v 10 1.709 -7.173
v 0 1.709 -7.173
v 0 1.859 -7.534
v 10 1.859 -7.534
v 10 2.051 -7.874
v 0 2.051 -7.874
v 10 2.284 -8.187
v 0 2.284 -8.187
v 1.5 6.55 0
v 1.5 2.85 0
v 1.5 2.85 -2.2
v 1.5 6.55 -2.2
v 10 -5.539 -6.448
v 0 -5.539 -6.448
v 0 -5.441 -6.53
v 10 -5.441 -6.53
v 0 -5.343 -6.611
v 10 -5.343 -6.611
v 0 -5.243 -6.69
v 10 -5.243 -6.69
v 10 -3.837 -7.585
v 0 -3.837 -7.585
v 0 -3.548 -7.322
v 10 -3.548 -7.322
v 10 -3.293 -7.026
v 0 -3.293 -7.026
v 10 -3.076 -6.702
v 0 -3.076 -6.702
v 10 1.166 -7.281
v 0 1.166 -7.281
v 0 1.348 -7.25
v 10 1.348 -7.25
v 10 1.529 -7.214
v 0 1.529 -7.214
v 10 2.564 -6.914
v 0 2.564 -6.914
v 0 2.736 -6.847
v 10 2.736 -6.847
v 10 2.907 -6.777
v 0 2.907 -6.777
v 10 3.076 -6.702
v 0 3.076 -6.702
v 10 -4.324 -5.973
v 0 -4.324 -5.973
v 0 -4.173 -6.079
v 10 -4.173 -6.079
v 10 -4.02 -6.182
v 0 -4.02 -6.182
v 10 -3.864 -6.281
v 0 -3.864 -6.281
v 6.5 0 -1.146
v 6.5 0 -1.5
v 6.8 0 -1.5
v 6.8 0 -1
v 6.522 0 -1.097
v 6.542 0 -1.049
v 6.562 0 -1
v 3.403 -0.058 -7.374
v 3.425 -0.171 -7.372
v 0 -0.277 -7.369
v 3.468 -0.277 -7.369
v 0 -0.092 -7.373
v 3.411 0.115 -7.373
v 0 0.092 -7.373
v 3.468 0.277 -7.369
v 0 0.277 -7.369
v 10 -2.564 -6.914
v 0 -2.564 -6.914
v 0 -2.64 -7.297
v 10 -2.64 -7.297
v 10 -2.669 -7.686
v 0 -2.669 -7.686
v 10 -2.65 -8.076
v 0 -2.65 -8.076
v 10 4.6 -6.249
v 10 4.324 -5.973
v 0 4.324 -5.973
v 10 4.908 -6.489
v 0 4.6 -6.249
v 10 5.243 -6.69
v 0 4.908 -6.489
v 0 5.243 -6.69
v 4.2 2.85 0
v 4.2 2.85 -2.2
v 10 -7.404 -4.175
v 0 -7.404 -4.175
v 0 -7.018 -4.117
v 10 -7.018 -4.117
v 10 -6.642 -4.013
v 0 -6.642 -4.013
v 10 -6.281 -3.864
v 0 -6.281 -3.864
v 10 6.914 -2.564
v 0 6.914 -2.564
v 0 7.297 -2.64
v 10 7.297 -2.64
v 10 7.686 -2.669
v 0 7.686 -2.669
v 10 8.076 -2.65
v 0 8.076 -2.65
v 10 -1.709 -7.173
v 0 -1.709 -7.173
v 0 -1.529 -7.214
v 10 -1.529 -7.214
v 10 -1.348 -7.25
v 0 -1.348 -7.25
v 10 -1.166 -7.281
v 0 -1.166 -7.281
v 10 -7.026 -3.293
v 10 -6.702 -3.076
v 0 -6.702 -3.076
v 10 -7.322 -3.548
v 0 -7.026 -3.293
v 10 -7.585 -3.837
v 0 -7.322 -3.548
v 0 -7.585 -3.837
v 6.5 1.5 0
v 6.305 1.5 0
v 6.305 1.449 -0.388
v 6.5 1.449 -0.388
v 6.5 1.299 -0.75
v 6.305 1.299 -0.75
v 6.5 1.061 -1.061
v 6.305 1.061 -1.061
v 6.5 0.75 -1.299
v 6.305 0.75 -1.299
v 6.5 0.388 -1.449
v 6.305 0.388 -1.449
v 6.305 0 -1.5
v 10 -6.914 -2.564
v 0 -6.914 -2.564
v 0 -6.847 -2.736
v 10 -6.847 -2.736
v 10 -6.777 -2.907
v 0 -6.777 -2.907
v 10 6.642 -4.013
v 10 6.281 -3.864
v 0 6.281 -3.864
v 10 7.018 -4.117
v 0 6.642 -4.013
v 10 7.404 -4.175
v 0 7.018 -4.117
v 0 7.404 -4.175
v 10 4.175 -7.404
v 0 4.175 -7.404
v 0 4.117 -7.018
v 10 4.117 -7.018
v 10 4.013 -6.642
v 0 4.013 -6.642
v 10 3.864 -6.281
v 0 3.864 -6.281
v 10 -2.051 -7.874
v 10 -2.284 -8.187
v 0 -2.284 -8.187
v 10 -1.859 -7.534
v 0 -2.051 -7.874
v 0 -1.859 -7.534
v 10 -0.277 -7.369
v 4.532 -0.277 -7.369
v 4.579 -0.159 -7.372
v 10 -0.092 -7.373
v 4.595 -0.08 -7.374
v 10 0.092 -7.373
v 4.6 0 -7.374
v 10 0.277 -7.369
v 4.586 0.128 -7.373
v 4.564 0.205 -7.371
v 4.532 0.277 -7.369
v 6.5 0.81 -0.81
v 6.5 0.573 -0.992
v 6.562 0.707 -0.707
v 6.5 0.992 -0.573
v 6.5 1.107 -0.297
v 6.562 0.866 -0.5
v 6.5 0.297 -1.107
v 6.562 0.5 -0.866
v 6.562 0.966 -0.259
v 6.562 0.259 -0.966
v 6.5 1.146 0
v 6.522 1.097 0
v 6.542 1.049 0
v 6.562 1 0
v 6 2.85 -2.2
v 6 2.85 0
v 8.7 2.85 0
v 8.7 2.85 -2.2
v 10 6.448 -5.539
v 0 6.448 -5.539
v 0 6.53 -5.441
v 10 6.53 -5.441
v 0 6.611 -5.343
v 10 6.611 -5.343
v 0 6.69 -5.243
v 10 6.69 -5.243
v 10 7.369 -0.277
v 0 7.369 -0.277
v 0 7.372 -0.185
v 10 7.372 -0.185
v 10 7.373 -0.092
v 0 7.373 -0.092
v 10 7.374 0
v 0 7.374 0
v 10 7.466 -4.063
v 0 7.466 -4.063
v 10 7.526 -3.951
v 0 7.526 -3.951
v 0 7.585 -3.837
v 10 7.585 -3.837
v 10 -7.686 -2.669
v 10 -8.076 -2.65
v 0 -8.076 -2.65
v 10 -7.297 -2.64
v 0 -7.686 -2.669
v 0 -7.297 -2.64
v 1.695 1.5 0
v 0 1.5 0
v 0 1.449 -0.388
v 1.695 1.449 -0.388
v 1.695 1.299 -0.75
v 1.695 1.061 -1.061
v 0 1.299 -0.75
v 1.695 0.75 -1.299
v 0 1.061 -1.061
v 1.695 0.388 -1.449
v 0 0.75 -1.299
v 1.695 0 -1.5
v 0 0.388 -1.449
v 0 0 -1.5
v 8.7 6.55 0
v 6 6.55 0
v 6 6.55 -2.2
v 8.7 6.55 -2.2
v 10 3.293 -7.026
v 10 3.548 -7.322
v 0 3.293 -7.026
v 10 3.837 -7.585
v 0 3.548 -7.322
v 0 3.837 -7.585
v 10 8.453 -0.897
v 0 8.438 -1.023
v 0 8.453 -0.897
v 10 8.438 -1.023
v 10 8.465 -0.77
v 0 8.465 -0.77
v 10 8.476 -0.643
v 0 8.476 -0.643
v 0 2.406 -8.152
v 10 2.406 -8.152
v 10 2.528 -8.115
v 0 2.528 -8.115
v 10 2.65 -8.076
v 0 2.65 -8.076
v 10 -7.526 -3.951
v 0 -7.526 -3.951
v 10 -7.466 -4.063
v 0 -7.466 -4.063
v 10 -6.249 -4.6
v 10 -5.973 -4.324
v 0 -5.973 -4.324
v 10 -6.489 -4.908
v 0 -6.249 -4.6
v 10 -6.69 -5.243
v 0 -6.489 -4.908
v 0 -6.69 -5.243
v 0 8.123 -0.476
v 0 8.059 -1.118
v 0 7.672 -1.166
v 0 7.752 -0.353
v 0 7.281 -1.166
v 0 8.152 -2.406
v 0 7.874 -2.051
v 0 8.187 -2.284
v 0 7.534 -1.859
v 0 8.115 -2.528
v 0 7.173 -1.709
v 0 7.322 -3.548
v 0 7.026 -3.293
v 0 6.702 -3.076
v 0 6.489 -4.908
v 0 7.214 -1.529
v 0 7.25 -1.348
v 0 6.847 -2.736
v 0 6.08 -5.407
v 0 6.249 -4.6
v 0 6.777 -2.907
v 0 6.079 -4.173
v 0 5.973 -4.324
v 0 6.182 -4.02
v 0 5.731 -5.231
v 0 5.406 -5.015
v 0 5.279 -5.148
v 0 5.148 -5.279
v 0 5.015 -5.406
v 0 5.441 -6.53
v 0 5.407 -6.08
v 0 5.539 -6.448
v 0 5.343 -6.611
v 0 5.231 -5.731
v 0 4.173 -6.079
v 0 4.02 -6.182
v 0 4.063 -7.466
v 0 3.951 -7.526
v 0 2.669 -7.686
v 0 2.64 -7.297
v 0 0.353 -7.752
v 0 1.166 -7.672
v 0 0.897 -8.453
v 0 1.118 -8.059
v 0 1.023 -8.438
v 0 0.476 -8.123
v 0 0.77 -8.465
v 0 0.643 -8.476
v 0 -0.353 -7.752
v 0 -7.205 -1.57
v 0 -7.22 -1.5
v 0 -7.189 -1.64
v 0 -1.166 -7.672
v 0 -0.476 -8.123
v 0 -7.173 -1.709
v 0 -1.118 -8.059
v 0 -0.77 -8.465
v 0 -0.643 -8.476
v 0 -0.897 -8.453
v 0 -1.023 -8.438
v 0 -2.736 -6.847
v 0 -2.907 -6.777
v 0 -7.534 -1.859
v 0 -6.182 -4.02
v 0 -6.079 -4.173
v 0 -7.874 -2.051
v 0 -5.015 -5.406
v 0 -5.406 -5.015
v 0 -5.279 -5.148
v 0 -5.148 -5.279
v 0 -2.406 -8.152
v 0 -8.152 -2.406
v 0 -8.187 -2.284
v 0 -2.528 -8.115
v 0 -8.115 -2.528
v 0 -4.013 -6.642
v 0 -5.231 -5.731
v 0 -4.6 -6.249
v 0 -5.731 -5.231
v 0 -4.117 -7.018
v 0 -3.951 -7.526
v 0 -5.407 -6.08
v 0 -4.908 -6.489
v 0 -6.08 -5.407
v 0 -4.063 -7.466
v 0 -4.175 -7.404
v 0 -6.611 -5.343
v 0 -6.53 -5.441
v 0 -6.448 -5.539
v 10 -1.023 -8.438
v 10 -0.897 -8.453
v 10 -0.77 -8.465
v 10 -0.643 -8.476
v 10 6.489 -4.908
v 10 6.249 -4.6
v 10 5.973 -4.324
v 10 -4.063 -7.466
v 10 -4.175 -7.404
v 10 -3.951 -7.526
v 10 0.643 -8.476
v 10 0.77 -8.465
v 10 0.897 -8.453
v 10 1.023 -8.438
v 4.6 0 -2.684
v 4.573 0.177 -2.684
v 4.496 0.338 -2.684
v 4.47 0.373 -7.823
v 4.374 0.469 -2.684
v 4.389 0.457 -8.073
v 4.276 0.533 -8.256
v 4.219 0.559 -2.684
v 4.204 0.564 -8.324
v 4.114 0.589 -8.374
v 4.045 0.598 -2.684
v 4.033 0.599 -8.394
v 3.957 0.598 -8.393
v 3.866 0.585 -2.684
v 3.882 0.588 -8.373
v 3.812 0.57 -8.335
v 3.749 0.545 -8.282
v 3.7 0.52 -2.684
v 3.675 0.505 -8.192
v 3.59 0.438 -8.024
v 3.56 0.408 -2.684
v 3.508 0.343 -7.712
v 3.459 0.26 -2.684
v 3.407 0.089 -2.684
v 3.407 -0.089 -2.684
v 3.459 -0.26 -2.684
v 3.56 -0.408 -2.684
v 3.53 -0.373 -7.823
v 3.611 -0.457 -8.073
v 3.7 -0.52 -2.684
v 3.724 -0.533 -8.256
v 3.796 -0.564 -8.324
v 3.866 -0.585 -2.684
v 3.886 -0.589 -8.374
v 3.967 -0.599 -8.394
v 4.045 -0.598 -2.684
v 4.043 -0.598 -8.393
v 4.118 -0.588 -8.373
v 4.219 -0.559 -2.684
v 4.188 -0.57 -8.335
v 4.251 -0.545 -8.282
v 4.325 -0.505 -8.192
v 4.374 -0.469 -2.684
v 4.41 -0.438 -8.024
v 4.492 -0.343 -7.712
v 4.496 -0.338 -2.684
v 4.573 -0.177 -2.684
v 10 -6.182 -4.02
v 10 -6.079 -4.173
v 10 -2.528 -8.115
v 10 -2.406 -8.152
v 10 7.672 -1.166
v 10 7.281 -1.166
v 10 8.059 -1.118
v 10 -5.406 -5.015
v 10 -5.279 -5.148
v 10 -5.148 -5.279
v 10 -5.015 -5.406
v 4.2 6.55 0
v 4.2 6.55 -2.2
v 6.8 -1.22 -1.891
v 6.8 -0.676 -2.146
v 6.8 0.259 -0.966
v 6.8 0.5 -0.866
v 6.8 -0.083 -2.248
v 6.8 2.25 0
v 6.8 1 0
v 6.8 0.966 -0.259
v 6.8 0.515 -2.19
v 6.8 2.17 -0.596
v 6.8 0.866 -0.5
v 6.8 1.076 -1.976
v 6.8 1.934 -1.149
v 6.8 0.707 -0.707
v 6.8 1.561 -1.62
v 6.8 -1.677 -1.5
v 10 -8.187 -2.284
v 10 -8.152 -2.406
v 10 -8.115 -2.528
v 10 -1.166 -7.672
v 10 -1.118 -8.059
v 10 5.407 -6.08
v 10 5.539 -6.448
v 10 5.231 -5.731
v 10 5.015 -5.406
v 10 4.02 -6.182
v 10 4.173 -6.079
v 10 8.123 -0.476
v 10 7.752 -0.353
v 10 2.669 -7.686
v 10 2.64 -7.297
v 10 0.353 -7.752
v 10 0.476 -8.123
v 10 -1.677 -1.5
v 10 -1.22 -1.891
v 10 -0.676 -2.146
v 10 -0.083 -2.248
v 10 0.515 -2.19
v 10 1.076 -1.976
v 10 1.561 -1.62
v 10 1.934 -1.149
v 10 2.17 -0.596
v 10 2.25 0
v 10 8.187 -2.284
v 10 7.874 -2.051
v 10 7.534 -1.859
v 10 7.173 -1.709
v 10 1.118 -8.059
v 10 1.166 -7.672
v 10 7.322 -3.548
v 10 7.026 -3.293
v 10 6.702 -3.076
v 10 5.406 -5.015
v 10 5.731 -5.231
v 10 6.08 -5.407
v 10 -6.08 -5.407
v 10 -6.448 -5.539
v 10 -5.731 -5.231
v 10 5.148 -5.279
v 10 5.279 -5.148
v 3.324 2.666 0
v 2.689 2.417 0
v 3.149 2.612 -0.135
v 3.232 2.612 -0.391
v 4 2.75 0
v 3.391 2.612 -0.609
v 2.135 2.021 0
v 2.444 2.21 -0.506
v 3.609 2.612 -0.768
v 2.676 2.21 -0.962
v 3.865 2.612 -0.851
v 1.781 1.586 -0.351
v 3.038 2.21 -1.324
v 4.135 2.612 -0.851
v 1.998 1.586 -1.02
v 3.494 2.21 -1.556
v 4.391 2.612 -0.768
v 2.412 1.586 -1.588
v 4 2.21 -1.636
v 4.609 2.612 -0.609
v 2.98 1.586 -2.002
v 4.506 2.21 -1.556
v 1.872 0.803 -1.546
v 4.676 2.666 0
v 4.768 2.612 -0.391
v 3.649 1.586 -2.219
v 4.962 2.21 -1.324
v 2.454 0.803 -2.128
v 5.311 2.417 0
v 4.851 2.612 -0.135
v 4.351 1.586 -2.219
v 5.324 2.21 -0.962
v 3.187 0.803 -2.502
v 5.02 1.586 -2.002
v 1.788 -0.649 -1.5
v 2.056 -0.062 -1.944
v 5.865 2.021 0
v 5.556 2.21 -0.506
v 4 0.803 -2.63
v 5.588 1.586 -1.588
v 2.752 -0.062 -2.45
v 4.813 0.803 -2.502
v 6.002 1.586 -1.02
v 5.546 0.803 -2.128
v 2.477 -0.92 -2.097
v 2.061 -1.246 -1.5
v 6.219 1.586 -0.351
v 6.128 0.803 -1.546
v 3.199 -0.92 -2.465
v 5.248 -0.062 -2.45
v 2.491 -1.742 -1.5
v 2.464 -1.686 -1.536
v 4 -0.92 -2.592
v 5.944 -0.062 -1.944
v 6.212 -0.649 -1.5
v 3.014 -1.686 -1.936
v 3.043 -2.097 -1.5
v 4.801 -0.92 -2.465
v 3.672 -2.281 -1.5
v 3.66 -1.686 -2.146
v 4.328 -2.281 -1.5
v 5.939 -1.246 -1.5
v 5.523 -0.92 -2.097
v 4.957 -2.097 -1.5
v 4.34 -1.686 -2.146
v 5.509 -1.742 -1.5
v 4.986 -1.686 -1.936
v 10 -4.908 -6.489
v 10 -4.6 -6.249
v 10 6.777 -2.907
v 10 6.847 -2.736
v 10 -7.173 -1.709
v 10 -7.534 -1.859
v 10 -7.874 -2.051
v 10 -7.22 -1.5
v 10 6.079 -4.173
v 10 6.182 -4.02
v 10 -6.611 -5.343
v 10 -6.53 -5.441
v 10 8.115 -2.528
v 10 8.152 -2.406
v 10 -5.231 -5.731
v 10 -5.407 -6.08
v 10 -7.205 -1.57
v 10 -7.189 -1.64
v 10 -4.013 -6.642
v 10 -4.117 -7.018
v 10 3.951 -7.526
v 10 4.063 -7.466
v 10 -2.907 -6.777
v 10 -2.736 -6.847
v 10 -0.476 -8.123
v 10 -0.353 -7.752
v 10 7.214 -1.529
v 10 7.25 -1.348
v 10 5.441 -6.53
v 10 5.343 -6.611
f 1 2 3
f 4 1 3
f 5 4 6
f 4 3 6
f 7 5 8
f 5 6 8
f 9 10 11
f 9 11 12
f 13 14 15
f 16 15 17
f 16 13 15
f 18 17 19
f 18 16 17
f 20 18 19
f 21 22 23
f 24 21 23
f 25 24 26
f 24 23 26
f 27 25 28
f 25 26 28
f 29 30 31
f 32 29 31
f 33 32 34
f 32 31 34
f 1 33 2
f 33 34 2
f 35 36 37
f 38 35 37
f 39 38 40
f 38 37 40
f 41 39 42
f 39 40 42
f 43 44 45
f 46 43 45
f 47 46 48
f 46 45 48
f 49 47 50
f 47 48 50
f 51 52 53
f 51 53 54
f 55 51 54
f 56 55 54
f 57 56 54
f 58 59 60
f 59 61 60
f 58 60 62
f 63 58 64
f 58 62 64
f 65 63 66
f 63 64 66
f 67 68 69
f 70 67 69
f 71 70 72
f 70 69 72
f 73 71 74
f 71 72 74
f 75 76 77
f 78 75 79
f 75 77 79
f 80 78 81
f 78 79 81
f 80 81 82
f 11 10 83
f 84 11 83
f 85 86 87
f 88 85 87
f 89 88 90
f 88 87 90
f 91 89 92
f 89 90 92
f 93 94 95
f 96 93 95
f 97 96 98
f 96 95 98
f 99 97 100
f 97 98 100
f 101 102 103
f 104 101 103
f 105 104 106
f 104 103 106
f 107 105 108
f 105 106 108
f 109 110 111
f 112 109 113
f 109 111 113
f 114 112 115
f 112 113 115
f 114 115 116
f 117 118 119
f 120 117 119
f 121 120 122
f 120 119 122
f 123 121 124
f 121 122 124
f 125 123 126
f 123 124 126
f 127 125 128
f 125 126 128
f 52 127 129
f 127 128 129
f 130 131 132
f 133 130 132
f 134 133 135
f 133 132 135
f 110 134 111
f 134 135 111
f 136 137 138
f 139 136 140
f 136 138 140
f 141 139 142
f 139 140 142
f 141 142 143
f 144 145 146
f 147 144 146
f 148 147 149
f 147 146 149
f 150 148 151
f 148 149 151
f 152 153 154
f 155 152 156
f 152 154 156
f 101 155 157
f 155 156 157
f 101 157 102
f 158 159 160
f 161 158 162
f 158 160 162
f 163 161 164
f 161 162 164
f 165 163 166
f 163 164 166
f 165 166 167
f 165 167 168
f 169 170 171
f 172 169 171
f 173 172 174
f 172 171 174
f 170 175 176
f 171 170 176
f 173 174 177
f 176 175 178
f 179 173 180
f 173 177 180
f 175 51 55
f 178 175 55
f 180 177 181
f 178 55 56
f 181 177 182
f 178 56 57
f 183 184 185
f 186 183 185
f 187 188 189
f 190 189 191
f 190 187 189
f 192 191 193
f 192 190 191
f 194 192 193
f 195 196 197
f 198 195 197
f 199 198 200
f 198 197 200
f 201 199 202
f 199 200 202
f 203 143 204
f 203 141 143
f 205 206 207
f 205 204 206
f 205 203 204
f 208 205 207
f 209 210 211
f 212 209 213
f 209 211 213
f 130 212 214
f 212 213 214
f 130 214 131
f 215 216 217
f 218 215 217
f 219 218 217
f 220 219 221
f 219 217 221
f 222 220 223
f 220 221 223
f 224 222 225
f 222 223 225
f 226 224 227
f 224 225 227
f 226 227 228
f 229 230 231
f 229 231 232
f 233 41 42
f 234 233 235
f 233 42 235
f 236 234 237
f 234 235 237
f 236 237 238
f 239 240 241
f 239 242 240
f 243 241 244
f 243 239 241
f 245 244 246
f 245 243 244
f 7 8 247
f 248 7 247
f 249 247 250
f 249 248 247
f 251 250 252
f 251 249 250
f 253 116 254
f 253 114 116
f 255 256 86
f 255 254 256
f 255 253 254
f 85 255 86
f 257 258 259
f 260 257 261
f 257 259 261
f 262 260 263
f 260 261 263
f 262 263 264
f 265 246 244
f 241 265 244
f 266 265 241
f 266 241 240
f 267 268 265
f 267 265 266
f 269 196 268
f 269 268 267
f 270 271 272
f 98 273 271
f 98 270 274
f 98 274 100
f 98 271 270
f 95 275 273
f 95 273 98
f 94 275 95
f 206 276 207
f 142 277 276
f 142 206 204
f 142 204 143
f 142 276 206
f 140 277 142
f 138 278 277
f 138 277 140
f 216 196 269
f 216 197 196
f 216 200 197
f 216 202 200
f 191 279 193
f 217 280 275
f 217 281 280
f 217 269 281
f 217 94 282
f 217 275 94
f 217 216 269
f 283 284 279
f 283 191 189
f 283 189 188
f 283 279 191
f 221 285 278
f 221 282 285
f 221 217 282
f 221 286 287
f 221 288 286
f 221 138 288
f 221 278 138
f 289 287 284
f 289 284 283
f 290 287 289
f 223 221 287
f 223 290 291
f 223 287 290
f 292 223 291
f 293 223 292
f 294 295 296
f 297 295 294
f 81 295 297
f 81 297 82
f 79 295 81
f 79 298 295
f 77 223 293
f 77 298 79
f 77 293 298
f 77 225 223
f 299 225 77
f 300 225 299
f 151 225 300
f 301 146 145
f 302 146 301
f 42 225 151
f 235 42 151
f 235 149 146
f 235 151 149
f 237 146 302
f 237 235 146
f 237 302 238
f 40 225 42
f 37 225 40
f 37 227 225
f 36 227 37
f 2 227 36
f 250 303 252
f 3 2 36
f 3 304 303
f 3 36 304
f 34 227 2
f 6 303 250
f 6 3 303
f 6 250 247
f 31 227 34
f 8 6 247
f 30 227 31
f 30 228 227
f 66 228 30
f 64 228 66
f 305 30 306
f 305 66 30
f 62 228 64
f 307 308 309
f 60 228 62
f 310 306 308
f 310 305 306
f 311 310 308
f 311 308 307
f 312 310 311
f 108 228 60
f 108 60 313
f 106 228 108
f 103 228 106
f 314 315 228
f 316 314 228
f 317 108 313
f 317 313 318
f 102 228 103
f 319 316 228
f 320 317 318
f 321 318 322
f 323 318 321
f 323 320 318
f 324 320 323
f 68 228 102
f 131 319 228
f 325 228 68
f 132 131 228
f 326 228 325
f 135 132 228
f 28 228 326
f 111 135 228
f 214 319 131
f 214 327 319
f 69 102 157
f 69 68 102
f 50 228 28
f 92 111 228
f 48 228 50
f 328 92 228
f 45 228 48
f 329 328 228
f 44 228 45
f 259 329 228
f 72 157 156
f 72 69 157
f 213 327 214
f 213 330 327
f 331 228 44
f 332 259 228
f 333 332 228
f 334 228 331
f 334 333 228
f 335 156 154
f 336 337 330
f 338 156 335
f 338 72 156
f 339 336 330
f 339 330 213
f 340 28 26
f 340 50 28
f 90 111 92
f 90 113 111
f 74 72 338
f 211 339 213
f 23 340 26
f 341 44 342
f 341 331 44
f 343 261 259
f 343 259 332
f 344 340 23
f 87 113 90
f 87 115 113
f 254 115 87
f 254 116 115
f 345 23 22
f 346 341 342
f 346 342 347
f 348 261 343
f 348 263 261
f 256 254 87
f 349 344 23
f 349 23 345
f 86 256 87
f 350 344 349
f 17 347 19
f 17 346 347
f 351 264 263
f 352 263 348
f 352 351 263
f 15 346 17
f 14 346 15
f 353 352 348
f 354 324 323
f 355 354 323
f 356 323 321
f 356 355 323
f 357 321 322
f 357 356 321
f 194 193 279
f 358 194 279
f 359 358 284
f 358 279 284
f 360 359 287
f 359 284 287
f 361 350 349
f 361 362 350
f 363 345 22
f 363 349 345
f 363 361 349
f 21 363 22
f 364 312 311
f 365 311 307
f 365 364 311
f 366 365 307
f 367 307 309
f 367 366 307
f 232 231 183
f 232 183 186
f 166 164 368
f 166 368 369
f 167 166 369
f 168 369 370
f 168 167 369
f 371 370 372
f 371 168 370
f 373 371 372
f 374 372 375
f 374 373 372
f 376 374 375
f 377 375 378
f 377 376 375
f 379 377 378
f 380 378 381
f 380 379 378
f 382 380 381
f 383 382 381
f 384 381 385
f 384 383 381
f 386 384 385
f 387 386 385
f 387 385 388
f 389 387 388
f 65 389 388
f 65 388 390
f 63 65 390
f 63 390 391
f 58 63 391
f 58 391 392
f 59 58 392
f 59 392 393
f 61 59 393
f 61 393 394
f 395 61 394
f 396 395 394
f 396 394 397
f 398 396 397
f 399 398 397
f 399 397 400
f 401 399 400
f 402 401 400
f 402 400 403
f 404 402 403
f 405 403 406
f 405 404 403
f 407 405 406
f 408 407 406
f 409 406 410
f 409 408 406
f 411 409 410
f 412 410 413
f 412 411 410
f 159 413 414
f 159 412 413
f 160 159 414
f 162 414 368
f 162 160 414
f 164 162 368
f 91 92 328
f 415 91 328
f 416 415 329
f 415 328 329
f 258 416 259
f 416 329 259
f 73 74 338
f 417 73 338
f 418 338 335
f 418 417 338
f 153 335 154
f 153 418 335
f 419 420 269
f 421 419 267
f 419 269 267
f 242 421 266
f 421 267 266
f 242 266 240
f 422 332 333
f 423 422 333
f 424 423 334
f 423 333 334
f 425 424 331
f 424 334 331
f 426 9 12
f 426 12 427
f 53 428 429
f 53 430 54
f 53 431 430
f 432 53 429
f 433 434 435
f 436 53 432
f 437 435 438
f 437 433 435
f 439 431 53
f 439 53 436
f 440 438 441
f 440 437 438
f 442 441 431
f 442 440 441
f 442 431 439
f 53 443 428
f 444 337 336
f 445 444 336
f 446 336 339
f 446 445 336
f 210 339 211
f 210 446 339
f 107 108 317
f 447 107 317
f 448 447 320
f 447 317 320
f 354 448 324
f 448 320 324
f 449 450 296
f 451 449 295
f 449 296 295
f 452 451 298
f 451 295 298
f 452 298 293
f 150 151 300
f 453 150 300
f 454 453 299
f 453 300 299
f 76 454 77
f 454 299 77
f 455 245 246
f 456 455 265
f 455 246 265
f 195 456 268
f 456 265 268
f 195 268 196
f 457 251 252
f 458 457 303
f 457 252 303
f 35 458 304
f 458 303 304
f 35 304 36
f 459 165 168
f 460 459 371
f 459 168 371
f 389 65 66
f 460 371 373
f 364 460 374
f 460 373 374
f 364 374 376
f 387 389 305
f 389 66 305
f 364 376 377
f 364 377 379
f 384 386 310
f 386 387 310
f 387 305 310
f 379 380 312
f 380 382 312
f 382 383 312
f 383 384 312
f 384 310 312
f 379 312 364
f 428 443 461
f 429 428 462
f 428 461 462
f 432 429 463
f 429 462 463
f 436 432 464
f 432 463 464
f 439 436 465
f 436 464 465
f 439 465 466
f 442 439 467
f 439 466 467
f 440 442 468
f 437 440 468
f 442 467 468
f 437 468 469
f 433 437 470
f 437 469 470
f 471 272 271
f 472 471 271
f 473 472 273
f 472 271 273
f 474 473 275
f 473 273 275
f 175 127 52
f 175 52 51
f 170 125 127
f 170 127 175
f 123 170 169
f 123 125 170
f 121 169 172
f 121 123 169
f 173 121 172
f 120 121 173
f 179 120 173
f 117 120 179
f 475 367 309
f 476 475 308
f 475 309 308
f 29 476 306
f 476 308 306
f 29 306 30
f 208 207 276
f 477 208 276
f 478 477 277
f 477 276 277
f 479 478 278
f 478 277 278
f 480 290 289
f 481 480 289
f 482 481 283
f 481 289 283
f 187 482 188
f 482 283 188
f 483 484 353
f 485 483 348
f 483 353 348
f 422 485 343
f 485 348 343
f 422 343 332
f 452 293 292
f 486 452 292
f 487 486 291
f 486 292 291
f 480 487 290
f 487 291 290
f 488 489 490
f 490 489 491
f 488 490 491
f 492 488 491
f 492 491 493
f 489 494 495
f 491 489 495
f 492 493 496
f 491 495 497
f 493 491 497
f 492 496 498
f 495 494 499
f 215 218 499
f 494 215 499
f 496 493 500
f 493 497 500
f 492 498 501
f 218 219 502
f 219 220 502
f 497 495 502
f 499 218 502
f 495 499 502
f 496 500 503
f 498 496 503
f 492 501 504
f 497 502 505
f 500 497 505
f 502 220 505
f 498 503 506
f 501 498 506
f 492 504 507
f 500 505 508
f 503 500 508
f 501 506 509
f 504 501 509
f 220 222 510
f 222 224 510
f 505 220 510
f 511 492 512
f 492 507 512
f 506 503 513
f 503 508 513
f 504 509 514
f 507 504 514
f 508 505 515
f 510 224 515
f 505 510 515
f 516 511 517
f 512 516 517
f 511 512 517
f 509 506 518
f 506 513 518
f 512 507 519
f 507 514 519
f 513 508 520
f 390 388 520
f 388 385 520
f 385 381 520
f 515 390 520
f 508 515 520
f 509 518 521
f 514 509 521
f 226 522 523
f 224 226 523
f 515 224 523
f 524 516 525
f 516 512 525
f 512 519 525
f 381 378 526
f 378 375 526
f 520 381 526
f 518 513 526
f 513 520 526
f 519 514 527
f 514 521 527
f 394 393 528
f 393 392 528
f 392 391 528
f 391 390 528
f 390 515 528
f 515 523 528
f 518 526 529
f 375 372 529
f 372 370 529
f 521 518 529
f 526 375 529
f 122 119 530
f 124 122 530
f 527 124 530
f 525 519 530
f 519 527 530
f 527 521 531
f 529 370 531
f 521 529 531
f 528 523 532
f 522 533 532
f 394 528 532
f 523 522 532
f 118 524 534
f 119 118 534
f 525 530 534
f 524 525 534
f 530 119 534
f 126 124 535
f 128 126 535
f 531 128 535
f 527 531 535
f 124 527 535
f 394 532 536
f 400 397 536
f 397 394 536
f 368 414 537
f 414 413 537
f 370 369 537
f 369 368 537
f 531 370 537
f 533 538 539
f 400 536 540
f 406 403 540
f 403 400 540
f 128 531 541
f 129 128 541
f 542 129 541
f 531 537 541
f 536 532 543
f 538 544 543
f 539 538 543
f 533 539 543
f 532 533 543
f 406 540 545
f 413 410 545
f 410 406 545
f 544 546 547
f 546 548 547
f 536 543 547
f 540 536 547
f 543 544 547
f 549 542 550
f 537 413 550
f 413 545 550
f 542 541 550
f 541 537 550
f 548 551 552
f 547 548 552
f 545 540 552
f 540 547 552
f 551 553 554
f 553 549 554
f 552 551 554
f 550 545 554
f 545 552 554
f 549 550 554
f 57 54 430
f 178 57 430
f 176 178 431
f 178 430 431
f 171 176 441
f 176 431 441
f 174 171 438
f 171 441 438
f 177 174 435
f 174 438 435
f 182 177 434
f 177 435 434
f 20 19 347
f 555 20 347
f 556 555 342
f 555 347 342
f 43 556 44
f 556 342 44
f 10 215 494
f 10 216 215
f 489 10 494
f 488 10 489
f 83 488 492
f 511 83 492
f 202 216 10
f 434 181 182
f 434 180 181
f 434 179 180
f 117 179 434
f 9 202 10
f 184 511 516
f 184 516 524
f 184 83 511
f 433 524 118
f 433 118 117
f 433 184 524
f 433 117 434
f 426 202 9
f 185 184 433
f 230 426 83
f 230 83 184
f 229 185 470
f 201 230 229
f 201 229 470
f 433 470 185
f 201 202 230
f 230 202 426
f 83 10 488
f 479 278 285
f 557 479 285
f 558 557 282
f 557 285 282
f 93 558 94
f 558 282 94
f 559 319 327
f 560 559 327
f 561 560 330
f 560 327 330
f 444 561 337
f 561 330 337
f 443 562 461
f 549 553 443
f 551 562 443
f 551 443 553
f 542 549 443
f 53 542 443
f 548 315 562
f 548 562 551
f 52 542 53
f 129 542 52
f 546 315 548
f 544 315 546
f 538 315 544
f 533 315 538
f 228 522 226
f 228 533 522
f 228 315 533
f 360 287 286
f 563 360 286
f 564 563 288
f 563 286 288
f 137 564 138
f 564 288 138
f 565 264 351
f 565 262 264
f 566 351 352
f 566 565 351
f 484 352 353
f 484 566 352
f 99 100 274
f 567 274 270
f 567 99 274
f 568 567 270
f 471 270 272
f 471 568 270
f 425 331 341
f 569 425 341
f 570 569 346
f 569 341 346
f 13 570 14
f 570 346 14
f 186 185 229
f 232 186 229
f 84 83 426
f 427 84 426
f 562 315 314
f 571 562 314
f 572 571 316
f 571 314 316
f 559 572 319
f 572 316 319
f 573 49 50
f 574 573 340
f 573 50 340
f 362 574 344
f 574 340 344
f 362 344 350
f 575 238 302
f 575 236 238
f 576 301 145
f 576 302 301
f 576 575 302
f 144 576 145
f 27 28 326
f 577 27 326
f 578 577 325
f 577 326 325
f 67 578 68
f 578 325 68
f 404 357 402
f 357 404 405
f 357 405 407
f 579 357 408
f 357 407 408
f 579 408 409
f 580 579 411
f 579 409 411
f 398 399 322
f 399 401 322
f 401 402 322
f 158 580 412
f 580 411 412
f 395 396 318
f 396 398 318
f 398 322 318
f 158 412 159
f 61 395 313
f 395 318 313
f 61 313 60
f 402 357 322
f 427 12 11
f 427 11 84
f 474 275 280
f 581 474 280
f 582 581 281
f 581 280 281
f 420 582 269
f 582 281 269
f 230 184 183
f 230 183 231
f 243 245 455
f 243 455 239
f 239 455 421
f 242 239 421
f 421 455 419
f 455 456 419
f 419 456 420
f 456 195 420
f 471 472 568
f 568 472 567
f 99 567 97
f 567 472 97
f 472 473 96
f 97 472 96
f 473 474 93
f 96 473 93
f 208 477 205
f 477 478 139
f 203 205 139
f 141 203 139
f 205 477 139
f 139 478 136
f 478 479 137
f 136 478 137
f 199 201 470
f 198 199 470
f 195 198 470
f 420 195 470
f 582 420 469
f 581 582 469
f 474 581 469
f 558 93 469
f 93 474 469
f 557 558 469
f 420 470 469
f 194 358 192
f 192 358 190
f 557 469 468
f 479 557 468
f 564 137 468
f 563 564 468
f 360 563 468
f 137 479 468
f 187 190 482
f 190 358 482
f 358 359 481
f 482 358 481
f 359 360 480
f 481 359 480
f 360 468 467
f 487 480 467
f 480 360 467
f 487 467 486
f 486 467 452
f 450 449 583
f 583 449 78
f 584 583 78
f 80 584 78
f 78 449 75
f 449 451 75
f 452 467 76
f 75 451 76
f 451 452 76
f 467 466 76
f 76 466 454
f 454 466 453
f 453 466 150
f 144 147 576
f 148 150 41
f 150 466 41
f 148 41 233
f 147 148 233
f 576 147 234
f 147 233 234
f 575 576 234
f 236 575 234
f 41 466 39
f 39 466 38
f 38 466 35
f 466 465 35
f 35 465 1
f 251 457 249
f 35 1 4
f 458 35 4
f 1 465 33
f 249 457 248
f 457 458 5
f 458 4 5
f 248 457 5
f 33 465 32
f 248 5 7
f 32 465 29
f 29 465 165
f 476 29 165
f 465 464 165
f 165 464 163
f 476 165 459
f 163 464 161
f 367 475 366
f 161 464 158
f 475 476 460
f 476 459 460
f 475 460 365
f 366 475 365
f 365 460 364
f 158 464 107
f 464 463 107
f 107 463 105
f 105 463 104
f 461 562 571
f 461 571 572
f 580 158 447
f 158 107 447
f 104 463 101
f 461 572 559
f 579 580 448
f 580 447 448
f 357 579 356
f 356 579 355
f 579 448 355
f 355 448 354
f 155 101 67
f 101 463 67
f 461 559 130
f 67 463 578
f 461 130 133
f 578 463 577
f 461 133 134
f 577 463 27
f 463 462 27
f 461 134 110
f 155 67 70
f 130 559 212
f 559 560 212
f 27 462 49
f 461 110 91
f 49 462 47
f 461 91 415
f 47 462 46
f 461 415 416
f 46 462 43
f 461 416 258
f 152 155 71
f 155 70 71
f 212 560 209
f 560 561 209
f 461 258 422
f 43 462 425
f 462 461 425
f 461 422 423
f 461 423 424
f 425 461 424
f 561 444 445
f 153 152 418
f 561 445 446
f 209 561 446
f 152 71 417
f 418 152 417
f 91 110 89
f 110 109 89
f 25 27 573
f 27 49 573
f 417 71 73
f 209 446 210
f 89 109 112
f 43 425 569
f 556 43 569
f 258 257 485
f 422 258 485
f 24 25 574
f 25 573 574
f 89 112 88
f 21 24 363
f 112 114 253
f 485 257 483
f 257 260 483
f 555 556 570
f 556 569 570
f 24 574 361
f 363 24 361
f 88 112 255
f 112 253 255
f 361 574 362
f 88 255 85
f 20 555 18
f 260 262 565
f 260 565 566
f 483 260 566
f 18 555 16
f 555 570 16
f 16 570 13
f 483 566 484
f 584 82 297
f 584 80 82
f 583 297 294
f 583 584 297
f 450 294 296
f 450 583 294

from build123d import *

# Parameters (mm, degrees)
BASPROSKE_W             = 10
BASPROSKE_H             = 8.5
TOOTHCUT_DEPTH          = 16.636495771
TEETHCUTS_COUNT         = 32
BORSKE_R                = 1
BORE_DEPTH              = 50.0000508
SKETCH1_R               = 2.25
CUT_EXTRUDE1_DEPTH      = 3.2
SKETCH2_W               = 3
SKETCH2_H               = 10
CUT_EXTRUDE2_DEPTH      = 16.610070769
CUT_EXTRUDE3_DEPTH      = 17.472745672
CUT_EXTRUDE3_DEPTH_BACK = 17.472745672
SKETCH3_R               = 0.6
SKETCH4_R               = 1.5
CUT_EXTRUDE4_DEPTH      = 6.5
SKETCH7_W               = 10.973728646
SKETCH7_H               = 17.598113622
CUT_EXTRUDE5_DEPTH      = 10
SKETCH8_W               = 2.7
SKETCH8_H               = 3.7
CUT_EXTRUDE6_DEPTH      = 2.2


with BuildPart() as part:
    # BasProSke → Base-Revolve (revolve)
    with BuildSketch(Plane(origin=(0, 0, 0), x_dir=(1, 0, 0), z_dir=(0, 1, 0)), mode=Mode.PRIVATE) as base_revolve_sk:
        with Locations((5, 4.25)):
            Rectangle(BASPROSKE_W, BASPROSKE_H)
    revolve(base_revolve_sk.sketch.rotate(Axis((-10, 0, 0), (1, 0, 0)), 180), axis=Axis((-10, 0, 0), (1, 0, 0)))

    # TooCutSke → ToothCut (cut, through all)
    with BuildSketch(Plane(origin=(0, 0, 0), x_dir=(0, 0, -1), z_dir=(1, 0, 0))):
        with BuildLine():
            ThreePointArc((0.277002447, 7.3687954), (0, 7.374), (-0.277002447, 7.3687954))
            ThreePointArc((-0.277002447, 7.3687954), (-0.41335061, 7.952280695), (-0.656086882, 8.500117362))
            ThreePointArc((-0.656086882, 8.500117362), (0, 8.5254), (0.656086882, 8.500117362))
            ThreePointArc((0.656086882, 8.500117362), (0.41335061, 7.952280695), (0.277002447, 7.3687954))
        make_face()
    toothcut = extrude(amount=TOOTHCUT_DEPTH, mode=Mode.SUBTRACT)

    # TeethCuts: ToothCut ×32 about axis
    teethcuts_axis = Axis((0, 0, 0), (1, 0, 0))
    for i in range(1, TEETHCUTS_COUNT):
        add(toothcut.rotate(teethcuts_axis, i * 360 / TEETHCUTS_COUNT), mode=Mode.SUBTRACT)

    # BorSke → Bore (cut, symmetric)
    with BuildSketch(Plane(origin=(0, 0, 0), x_dir=(0, 0, -1), z_dir=(1, 0, 0))):
        with Locations(Location((0, 0, 0), (0, 0, 180))):
            Circle(BORSKE_R)
    extrude(amount=BORE_DEPTH, both=True, mode=Mode.SUBTRACT)

    # Sketch1 → Cut-Extrude1 (cut)
    with BuildSketch(Plane(origin=(10, 0, 0), x_dir=(0, 0, -1), z_dir=(1, 0, 0))):
        Circle(SKETCH1_R)
    extrude(amount=-CUT_EXTRUDE1_DEPTH, mode=Mode.SUBTRACT)

    # Sketch2 → Cut-Extrude2 (cut, through all)
    with BuildSketch(Plane.ZY):
        with Locations((0, -5)):
            Rectangle(SKETCH2_W, SKETCH2_H)
    extrude(amount=-CUT_EXTRUDE2_DEPTH, mode=Mode.SUBTRACT)

    # Sketch3 → Cut-Extrude3 (cut, two sides: drawn at the far end of the back side and taken through both)
    with BuildSketch(Plane.XY.offset(-1.5).offset(-CUT_EXTRUDE3_DEPTH_BACK)):
        with Locations((4, 0)):
            Circle(SKETCH3_R)
    extrude(amount=CUT_EXTRUDE3_DEPTH + CUT_EXTRUDE3_DEPTH_BACK, mode=Mode.SUBTRACT)

    # Sketch4 → Cut-Extrude4 (cut)
    with BuildSketch(Plane.ZY):
        Circle(SKETCH4_R)
    extrude(amount=-CUT_EXTRUDE4_DEPTH, mode=Mode.SUBTRACT)

    # Sketch6 → Cut-Revolve1 (revolve, cut)
    with BuildSketch(Plane.XY):
        with BuildLine():
            ThreePointArc((4, 2.75), (6.75, 0), (4, -2.75))
            Line((4, -2.75), (4, 0))
            Line((4, 0), (4, 2.75))
        make_face()
    revolve(axis=Axis((4, 0, 0), (0, -1, 0)), mode=Mode.SUBTRACT)

    # Sketch7 → Cut-Extrude5 (cut)
    with BuildSketch(Plane.XY):
        with Locations((4.910782694, 0.110648149)):
            Rectangle(SKETCH7_W, SKETCH7_H)
    extrude(amount=CUT_EXTRUDE5_DEPTH, mode=Mode.SUBTRACT)

    # Sketch8 → Cut-Extrude6 (cut)
    with BuildSketch(Plane.XY):
        with Locations((7.35, 4.7)):
            Rectangle(SKETCH8_W, SKETCH8_H)
        with Locations((2.85, 4.7)):
            Rectangle(SKETCH8_W, SKETCH8_H)
    extrude(amount=-CUT_EXTRUDE6_DEPTH, mode=Mode.SUBTRACT)


solid = part.part
